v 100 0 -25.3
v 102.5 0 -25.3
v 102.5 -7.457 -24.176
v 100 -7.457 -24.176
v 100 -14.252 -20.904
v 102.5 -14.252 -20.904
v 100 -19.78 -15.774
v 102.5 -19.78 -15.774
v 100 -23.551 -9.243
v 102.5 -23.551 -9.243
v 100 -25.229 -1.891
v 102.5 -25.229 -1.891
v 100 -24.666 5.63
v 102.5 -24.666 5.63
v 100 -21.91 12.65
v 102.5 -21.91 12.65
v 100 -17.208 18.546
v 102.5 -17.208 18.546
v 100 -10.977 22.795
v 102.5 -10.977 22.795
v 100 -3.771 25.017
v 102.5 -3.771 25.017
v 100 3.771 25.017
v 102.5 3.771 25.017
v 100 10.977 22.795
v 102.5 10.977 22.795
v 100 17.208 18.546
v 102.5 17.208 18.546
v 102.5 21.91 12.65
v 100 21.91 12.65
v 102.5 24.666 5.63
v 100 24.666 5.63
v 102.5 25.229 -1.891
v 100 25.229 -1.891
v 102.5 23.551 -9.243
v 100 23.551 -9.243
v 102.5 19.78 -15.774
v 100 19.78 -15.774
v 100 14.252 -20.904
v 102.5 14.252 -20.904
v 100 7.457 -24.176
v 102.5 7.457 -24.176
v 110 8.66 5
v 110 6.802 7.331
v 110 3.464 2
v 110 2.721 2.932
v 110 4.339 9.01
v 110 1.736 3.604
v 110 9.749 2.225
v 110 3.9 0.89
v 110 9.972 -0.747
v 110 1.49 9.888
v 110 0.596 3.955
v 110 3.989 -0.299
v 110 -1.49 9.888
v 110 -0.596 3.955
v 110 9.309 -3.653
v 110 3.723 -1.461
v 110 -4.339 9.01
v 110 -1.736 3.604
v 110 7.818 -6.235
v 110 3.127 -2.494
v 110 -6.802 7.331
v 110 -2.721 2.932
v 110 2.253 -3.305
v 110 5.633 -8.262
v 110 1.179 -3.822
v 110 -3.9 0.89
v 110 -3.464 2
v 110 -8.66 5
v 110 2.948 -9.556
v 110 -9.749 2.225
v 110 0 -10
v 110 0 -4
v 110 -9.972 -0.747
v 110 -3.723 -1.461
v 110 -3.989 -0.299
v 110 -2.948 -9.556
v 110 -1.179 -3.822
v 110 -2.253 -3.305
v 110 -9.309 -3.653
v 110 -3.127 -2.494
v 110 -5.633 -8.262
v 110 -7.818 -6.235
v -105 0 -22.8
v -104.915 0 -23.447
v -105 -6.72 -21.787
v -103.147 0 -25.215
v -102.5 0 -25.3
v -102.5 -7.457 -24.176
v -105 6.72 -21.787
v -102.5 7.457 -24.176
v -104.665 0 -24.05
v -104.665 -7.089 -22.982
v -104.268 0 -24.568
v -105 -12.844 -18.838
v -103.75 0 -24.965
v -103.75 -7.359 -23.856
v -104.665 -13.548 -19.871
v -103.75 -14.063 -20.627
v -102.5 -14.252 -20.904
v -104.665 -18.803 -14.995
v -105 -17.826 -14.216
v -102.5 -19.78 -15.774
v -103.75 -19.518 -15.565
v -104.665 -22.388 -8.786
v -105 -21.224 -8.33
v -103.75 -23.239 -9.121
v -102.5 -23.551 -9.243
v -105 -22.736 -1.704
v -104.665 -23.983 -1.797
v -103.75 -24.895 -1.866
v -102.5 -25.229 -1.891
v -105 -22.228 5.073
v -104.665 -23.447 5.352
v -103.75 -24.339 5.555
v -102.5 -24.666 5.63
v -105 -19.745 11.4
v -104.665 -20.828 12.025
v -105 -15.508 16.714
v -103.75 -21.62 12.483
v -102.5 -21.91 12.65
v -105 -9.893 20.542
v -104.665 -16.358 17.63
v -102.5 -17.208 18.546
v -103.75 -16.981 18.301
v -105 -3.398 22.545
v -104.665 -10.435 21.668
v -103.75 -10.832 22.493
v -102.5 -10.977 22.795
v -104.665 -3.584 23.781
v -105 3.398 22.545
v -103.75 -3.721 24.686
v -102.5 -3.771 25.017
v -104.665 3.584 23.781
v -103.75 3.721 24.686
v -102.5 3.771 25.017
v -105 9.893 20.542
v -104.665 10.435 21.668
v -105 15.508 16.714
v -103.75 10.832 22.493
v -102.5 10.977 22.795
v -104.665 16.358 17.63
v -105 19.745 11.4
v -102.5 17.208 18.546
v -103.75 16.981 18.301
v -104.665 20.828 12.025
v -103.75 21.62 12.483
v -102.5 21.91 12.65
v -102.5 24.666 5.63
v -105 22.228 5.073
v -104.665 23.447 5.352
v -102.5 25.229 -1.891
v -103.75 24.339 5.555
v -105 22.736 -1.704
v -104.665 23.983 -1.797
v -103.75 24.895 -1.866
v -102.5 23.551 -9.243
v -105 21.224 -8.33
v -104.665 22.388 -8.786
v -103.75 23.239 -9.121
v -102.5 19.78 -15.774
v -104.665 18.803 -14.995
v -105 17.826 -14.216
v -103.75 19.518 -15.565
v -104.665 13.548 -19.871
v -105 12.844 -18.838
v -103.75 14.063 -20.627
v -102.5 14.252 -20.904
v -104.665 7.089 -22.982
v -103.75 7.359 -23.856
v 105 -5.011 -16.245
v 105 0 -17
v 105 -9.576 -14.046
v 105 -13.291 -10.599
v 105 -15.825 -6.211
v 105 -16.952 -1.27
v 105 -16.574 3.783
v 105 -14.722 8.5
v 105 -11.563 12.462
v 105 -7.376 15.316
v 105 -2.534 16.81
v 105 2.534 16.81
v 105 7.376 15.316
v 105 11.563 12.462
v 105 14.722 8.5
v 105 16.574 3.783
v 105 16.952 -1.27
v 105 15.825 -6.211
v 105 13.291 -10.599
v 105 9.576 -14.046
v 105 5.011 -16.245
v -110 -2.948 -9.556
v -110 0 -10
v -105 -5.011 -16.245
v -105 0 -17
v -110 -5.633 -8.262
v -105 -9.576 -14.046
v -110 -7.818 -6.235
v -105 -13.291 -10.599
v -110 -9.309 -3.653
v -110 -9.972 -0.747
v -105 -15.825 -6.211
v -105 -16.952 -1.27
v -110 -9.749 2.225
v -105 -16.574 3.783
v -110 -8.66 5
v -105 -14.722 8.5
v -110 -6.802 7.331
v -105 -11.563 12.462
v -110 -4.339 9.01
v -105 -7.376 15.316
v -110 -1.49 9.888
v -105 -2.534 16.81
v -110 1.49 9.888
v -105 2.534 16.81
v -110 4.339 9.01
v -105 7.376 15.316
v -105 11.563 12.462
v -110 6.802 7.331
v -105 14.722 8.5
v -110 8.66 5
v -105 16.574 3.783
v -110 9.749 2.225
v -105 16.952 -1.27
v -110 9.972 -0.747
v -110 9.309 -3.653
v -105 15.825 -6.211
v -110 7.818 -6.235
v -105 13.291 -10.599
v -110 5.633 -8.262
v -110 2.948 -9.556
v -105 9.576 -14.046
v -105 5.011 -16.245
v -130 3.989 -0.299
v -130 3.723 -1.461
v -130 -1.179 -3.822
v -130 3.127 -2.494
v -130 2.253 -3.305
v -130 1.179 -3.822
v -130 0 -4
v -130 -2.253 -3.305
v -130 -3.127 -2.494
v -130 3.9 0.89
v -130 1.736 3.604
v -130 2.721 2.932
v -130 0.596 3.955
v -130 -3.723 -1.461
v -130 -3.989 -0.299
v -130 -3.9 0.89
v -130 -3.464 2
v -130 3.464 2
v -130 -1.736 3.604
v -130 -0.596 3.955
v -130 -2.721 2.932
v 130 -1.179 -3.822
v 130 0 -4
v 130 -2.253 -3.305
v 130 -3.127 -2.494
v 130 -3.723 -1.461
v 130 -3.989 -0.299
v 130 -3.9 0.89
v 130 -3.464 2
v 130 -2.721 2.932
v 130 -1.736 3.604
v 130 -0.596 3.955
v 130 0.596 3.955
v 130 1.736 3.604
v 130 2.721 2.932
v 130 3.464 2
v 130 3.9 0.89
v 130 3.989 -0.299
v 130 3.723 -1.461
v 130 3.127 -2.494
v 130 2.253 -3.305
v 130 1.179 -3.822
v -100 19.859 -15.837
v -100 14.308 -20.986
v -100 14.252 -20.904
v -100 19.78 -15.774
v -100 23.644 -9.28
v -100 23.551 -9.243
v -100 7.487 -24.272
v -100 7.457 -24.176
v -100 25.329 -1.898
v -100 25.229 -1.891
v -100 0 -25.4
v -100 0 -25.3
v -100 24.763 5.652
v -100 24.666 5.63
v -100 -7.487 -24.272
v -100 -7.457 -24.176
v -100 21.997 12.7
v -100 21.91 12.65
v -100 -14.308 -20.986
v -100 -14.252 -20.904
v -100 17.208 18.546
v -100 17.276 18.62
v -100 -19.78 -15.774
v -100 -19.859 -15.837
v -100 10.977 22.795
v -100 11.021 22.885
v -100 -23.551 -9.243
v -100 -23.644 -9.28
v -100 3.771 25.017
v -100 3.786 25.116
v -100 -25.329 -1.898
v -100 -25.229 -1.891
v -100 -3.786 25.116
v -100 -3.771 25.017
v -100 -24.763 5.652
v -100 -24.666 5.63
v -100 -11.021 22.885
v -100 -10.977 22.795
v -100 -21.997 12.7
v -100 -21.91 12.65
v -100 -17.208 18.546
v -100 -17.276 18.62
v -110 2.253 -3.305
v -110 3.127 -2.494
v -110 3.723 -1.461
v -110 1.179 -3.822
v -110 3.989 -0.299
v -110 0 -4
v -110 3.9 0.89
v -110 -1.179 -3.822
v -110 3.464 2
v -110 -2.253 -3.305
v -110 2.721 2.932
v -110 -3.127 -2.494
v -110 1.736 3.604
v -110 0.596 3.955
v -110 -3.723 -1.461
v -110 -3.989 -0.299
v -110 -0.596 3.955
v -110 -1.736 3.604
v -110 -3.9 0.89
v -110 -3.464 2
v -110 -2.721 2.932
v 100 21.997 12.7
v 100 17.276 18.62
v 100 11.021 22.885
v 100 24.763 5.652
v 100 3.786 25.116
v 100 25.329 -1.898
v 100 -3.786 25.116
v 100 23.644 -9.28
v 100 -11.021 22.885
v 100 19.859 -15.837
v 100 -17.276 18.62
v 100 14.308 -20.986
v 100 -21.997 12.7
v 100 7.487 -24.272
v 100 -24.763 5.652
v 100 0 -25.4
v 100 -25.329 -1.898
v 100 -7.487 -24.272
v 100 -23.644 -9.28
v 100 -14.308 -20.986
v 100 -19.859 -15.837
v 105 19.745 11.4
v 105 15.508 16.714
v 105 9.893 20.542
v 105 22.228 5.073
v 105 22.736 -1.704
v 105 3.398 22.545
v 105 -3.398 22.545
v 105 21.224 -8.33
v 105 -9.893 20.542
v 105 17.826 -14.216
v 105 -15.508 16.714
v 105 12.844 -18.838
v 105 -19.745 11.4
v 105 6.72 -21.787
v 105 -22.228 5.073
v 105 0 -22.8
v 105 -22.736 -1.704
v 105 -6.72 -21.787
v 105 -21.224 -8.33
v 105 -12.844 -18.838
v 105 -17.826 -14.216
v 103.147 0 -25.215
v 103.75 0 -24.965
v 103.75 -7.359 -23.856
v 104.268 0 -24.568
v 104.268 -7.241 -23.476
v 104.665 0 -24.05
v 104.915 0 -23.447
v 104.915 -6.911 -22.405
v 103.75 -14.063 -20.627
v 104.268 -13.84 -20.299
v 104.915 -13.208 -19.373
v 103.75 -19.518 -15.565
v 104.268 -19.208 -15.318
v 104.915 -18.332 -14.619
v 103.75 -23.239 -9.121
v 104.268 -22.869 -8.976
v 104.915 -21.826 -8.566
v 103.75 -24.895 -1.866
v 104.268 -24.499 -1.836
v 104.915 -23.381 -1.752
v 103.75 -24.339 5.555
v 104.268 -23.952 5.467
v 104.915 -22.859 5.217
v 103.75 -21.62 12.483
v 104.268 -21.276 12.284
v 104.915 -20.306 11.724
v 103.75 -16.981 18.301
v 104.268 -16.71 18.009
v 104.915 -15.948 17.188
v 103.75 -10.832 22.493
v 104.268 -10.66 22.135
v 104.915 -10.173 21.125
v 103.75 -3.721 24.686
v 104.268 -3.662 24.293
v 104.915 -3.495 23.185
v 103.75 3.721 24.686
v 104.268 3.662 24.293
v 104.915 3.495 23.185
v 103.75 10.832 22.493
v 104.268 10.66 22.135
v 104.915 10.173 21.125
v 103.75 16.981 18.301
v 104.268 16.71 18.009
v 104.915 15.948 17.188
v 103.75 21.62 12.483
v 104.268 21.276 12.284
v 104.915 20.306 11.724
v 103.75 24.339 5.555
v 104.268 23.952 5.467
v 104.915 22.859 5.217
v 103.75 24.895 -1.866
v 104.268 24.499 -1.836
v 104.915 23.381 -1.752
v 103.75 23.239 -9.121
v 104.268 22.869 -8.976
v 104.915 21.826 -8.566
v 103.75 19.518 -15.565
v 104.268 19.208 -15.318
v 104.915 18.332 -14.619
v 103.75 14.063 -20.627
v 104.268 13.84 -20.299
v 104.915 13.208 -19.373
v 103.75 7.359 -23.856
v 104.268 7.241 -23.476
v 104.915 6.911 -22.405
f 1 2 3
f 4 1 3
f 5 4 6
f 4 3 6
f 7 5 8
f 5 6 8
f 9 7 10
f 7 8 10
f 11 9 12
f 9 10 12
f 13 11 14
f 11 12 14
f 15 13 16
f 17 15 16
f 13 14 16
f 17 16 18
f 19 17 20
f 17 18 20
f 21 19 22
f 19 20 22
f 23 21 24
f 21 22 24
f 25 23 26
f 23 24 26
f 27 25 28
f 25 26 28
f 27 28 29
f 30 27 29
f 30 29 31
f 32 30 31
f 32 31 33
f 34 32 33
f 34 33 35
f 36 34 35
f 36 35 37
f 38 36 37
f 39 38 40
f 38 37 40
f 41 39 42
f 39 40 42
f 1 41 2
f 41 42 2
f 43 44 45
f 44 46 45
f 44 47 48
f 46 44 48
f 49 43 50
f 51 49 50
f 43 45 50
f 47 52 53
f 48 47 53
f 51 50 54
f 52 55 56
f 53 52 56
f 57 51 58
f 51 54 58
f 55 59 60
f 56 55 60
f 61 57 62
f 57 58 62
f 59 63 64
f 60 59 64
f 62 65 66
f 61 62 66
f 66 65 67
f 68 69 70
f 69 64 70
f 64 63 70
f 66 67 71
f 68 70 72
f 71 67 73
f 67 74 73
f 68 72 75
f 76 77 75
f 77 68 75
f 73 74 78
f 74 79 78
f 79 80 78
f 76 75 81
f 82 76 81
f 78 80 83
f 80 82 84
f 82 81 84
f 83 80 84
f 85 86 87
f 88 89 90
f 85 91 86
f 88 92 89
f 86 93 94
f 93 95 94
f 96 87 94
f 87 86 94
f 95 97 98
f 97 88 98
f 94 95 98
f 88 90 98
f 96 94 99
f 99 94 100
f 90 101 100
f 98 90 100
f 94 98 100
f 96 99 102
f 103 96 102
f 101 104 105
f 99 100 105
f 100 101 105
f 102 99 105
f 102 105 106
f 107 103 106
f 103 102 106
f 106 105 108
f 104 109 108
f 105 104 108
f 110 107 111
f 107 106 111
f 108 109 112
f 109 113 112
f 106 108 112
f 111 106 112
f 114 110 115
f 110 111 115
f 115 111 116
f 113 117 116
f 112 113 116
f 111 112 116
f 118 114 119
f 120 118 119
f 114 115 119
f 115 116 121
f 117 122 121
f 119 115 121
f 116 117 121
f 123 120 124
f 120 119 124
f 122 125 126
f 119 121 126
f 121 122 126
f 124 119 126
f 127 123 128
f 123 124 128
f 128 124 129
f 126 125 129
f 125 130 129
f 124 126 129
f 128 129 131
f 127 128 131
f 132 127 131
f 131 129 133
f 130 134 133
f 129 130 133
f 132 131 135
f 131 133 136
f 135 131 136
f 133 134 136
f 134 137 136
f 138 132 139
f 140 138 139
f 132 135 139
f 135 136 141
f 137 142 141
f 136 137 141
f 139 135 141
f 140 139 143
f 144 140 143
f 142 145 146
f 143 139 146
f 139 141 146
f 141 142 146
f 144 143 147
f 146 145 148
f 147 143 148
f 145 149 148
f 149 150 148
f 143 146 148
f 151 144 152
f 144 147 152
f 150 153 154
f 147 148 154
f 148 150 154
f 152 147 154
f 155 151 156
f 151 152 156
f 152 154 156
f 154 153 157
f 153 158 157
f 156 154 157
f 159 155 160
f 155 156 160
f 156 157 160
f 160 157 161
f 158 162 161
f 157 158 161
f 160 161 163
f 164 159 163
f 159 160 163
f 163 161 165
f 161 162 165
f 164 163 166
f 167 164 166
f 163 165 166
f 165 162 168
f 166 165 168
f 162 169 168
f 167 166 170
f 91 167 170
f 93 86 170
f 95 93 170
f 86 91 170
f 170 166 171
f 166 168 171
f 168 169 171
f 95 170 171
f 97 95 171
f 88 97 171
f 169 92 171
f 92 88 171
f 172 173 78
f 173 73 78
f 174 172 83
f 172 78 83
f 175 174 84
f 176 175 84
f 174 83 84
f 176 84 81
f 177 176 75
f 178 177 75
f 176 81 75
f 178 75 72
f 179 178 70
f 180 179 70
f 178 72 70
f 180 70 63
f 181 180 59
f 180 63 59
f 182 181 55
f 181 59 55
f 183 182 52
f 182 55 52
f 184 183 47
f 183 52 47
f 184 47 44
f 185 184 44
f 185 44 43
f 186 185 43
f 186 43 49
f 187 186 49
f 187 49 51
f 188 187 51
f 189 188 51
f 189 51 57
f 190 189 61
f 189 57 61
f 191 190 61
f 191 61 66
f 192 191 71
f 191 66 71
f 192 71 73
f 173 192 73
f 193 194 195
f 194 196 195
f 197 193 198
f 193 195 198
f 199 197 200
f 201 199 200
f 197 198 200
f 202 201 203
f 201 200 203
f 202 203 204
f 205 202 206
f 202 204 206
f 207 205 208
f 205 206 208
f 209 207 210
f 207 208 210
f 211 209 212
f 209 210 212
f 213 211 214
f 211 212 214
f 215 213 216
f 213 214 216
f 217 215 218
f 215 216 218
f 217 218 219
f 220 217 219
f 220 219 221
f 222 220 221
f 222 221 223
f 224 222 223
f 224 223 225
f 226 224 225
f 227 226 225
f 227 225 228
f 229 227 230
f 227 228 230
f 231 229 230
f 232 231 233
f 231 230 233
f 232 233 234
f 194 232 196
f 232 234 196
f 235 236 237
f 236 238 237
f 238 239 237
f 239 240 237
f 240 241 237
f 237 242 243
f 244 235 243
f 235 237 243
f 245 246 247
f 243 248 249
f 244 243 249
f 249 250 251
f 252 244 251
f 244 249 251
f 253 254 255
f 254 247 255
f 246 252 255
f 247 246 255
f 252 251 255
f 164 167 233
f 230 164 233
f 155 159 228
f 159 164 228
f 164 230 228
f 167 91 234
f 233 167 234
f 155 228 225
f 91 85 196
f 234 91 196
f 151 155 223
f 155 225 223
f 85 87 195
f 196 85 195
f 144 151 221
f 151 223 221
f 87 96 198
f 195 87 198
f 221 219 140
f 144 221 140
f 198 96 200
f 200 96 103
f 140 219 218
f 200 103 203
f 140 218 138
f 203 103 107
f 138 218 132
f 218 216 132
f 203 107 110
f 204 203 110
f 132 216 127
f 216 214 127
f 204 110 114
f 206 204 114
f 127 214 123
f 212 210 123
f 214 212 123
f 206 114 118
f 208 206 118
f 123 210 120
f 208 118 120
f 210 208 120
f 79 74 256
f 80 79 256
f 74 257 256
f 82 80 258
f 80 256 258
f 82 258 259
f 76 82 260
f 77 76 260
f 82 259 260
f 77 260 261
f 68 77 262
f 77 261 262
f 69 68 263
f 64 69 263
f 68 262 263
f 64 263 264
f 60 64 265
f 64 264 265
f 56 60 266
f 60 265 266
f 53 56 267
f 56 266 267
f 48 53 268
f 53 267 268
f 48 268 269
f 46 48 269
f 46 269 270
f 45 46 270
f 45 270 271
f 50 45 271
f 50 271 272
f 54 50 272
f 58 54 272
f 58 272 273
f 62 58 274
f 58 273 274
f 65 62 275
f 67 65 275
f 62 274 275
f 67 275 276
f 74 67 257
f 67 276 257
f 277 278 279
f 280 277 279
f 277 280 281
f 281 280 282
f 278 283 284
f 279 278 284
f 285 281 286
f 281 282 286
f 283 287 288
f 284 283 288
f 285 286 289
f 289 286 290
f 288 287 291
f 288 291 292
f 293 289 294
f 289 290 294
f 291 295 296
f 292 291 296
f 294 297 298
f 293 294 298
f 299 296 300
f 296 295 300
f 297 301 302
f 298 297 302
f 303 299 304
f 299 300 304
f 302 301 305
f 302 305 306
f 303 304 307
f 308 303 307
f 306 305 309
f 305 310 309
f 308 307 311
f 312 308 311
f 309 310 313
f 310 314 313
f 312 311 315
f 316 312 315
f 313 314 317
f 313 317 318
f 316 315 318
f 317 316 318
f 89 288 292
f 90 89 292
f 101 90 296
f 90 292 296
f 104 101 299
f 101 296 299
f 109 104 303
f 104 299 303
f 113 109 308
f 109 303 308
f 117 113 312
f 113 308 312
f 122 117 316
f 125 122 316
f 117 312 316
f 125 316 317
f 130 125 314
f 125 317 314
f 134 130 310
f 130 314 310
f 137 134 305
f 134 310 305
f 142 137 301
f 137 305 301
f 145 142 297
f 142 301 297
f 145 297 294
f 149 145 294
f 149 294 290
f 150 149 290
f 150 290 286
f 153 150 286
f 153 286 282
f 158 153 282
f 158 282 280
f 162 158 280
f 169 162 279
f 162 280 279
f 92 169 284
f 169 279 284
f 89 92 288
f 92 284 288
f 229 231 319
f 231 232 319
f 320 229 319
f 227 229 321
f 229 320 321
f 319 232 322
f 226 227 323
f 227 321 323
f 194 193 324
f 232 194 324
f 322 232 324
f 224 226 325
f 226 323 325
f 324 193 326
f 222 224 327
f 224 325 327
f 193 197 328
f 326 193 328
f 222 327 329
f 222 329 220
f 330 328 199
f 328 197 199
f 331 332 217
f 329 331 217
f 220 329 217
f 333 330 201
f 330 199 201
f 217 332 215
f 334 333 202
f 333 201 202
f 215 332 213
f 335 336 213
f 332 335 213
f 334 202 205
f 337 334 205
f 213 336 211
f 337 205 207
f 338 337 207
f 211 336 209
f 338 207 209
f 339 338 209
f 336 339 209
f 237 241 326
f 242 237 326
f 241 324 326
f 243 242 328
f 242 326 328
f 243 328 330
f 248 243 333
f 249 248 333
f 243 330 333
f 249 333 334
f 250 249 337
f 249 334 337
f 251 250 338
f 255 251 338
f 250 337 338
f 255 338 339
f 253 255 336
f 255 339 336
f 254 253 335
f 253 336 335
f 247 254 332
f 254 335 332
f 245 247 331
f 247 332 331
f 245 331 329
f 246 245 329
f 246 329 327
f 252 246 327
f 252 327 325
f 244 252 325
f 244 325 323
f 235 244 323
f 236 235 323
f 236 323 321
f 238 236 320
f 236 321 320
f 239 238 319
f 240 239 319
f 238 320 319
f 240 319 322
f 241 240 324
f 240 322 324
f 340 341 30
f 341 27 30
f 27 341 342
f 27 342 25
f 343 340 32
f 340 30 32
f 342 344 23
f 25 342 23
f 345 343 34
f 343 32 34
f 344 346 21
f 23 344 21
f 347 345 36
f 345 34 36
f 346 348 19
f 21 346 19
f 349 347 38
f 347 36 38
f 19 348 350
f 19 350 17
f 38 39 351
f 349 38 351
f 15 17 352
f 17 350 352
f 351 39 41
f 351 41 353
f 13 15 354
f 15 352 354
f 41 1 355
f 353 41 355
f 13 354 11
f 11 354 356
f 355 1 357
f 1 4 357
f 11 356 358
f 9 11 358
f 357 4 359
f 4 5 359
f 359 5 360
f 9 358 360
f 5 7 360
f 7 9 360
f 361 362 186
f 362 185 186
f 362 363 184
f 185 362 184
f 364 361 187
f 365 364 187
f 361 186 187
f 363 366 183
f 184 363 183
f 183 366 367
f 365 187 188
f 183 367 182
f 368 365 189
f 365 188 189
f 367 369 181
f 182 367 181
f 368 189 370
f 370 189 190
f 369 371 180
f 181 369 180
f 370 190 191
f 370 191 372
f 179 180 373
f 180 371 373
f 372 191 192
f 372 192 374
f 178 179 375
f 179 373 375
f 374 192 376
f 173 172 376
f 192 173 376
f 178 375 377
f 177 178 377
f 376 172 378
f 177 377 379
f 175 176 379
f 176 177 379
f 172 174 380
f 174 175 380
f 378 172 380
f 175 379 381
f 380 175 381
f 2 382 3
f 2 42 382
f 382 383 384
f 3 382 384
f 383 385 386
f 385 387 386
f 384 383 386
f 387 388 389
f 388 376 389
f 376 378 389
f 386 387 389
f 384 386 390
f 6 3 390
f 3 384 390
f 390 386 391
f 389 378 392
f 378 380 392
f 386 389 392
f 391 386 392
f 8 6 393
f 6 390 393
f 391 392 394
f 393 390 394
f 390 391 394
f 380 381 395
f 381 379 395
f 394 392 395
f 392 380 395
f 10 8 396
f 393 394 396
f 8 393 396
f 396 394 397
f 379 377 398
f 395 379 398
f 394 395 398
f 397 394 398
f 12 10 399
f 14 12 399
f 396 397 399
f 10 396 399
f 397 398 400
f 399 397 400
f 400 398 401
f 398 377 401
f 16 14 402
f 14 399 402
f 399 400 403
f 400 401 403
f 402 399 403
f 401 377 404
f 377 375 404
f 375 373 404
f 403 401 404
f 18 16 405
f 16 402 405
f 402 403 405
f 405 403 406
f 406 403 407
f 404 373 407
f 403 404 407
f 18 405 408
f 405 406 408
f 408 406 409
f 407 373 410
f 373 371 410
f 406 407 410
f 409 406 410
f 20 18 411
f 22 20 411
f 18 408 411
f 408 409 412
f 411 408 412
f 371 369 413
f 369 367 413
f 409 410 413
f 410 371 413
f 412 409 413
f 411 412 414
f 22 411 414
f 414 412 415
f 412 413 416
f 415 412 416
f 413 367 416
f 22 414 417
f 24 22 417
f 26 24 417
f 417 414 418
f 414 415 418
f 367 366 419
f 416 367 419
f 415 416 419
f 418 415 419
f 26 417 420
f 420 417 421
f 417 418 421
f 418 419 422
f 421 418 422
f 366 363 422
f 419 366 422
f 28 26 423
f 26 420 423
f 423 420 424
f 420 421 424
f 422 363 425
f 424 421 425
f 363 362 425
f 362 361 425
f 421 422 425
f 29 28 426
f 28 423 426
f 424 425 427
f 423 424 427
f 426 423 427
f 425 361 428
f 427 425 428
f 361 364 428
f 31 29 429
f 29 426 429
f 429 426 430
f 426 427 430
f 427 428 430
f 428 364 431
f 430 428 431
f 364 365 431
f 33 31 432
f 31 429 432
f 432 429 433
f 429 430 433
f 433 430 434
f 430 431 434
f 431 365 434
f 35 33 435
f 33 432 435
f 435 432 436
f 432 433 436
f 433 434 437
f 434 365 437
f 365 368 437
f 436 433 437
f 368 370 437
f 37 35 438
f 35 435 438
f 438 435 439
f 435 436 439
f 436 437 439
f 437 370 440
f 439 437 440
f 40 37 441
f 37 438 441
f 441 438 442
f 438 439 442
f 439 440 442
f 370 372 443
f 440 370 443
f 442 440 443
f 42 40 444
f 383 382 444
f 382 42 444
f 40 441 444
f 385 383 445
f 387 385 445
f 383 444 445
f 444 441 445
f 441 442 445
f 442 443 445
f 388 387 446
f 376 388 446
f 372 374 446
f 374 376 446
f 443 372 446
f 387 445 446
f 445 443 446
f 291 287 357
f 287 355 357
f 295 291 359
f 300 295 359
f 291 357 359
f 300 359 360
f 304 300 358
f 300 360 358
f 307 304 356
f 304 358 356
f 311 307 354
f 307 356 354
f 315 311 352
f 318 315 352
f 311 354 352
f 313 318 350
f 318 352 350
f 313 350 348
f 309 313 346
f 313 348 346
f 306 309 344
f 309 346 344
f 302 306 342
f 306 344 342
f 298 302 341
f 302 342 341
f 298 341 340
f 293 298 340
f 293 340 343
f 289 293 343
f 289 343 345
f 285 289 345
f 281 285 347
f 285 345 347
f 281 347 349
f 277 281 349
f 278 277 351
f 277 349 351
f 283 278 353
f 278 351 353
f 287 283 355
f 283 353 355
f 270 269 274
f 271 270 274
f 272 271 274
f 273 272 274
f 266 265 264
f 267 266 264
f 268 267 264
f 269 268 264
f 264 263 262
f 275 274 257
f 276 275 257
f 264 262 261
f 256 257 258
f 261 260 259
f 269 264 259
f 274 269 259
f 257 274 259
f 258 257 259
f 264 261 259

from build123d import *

# Parameters (mm, degrees)
FILLET1_R = 2.5


with BuildPart() as part:
    # Sketch1 → Revolve1 (revolve)
    with BuildSketch(Plane(origin=(0, 0, 0), x_dir=(1, 0, 0), z_dir=(0, 1, 0)), mode=Mode.PRIVATE) as revolve1_sk:
        Polygon((0, 0), (0, -25.4), (100, -25.4), (100, -25.3), (105, -25.3), (105, -17), (110, -10), (110, -4), (130, -4), (130, 0), align=None)
        Polygon((-100, -25.3), (-100, -25.4), (0, -25.4), (0, 0), (-130, 0), (-130, -4), (-110, -4), (-110, -10), (-105, -17), (-105, -25.3), align=None)
    revolve(revolve1_sk.sketch.rotate(Axis((130, 0, 0), (-1, 0, 0)), 180), axis=Axis((130, 0, 0), (-1, 0, 0)))

    # Fillet1
    fillet1_edges = [part.edges().sort_by_distance(p)[0] for p in [
        (105, 0, 25.3),
        (-105, 0, 25.3),
    ]]
    fillet(fillet1_edges, radius=FILLET1_R)


solid = part.part
